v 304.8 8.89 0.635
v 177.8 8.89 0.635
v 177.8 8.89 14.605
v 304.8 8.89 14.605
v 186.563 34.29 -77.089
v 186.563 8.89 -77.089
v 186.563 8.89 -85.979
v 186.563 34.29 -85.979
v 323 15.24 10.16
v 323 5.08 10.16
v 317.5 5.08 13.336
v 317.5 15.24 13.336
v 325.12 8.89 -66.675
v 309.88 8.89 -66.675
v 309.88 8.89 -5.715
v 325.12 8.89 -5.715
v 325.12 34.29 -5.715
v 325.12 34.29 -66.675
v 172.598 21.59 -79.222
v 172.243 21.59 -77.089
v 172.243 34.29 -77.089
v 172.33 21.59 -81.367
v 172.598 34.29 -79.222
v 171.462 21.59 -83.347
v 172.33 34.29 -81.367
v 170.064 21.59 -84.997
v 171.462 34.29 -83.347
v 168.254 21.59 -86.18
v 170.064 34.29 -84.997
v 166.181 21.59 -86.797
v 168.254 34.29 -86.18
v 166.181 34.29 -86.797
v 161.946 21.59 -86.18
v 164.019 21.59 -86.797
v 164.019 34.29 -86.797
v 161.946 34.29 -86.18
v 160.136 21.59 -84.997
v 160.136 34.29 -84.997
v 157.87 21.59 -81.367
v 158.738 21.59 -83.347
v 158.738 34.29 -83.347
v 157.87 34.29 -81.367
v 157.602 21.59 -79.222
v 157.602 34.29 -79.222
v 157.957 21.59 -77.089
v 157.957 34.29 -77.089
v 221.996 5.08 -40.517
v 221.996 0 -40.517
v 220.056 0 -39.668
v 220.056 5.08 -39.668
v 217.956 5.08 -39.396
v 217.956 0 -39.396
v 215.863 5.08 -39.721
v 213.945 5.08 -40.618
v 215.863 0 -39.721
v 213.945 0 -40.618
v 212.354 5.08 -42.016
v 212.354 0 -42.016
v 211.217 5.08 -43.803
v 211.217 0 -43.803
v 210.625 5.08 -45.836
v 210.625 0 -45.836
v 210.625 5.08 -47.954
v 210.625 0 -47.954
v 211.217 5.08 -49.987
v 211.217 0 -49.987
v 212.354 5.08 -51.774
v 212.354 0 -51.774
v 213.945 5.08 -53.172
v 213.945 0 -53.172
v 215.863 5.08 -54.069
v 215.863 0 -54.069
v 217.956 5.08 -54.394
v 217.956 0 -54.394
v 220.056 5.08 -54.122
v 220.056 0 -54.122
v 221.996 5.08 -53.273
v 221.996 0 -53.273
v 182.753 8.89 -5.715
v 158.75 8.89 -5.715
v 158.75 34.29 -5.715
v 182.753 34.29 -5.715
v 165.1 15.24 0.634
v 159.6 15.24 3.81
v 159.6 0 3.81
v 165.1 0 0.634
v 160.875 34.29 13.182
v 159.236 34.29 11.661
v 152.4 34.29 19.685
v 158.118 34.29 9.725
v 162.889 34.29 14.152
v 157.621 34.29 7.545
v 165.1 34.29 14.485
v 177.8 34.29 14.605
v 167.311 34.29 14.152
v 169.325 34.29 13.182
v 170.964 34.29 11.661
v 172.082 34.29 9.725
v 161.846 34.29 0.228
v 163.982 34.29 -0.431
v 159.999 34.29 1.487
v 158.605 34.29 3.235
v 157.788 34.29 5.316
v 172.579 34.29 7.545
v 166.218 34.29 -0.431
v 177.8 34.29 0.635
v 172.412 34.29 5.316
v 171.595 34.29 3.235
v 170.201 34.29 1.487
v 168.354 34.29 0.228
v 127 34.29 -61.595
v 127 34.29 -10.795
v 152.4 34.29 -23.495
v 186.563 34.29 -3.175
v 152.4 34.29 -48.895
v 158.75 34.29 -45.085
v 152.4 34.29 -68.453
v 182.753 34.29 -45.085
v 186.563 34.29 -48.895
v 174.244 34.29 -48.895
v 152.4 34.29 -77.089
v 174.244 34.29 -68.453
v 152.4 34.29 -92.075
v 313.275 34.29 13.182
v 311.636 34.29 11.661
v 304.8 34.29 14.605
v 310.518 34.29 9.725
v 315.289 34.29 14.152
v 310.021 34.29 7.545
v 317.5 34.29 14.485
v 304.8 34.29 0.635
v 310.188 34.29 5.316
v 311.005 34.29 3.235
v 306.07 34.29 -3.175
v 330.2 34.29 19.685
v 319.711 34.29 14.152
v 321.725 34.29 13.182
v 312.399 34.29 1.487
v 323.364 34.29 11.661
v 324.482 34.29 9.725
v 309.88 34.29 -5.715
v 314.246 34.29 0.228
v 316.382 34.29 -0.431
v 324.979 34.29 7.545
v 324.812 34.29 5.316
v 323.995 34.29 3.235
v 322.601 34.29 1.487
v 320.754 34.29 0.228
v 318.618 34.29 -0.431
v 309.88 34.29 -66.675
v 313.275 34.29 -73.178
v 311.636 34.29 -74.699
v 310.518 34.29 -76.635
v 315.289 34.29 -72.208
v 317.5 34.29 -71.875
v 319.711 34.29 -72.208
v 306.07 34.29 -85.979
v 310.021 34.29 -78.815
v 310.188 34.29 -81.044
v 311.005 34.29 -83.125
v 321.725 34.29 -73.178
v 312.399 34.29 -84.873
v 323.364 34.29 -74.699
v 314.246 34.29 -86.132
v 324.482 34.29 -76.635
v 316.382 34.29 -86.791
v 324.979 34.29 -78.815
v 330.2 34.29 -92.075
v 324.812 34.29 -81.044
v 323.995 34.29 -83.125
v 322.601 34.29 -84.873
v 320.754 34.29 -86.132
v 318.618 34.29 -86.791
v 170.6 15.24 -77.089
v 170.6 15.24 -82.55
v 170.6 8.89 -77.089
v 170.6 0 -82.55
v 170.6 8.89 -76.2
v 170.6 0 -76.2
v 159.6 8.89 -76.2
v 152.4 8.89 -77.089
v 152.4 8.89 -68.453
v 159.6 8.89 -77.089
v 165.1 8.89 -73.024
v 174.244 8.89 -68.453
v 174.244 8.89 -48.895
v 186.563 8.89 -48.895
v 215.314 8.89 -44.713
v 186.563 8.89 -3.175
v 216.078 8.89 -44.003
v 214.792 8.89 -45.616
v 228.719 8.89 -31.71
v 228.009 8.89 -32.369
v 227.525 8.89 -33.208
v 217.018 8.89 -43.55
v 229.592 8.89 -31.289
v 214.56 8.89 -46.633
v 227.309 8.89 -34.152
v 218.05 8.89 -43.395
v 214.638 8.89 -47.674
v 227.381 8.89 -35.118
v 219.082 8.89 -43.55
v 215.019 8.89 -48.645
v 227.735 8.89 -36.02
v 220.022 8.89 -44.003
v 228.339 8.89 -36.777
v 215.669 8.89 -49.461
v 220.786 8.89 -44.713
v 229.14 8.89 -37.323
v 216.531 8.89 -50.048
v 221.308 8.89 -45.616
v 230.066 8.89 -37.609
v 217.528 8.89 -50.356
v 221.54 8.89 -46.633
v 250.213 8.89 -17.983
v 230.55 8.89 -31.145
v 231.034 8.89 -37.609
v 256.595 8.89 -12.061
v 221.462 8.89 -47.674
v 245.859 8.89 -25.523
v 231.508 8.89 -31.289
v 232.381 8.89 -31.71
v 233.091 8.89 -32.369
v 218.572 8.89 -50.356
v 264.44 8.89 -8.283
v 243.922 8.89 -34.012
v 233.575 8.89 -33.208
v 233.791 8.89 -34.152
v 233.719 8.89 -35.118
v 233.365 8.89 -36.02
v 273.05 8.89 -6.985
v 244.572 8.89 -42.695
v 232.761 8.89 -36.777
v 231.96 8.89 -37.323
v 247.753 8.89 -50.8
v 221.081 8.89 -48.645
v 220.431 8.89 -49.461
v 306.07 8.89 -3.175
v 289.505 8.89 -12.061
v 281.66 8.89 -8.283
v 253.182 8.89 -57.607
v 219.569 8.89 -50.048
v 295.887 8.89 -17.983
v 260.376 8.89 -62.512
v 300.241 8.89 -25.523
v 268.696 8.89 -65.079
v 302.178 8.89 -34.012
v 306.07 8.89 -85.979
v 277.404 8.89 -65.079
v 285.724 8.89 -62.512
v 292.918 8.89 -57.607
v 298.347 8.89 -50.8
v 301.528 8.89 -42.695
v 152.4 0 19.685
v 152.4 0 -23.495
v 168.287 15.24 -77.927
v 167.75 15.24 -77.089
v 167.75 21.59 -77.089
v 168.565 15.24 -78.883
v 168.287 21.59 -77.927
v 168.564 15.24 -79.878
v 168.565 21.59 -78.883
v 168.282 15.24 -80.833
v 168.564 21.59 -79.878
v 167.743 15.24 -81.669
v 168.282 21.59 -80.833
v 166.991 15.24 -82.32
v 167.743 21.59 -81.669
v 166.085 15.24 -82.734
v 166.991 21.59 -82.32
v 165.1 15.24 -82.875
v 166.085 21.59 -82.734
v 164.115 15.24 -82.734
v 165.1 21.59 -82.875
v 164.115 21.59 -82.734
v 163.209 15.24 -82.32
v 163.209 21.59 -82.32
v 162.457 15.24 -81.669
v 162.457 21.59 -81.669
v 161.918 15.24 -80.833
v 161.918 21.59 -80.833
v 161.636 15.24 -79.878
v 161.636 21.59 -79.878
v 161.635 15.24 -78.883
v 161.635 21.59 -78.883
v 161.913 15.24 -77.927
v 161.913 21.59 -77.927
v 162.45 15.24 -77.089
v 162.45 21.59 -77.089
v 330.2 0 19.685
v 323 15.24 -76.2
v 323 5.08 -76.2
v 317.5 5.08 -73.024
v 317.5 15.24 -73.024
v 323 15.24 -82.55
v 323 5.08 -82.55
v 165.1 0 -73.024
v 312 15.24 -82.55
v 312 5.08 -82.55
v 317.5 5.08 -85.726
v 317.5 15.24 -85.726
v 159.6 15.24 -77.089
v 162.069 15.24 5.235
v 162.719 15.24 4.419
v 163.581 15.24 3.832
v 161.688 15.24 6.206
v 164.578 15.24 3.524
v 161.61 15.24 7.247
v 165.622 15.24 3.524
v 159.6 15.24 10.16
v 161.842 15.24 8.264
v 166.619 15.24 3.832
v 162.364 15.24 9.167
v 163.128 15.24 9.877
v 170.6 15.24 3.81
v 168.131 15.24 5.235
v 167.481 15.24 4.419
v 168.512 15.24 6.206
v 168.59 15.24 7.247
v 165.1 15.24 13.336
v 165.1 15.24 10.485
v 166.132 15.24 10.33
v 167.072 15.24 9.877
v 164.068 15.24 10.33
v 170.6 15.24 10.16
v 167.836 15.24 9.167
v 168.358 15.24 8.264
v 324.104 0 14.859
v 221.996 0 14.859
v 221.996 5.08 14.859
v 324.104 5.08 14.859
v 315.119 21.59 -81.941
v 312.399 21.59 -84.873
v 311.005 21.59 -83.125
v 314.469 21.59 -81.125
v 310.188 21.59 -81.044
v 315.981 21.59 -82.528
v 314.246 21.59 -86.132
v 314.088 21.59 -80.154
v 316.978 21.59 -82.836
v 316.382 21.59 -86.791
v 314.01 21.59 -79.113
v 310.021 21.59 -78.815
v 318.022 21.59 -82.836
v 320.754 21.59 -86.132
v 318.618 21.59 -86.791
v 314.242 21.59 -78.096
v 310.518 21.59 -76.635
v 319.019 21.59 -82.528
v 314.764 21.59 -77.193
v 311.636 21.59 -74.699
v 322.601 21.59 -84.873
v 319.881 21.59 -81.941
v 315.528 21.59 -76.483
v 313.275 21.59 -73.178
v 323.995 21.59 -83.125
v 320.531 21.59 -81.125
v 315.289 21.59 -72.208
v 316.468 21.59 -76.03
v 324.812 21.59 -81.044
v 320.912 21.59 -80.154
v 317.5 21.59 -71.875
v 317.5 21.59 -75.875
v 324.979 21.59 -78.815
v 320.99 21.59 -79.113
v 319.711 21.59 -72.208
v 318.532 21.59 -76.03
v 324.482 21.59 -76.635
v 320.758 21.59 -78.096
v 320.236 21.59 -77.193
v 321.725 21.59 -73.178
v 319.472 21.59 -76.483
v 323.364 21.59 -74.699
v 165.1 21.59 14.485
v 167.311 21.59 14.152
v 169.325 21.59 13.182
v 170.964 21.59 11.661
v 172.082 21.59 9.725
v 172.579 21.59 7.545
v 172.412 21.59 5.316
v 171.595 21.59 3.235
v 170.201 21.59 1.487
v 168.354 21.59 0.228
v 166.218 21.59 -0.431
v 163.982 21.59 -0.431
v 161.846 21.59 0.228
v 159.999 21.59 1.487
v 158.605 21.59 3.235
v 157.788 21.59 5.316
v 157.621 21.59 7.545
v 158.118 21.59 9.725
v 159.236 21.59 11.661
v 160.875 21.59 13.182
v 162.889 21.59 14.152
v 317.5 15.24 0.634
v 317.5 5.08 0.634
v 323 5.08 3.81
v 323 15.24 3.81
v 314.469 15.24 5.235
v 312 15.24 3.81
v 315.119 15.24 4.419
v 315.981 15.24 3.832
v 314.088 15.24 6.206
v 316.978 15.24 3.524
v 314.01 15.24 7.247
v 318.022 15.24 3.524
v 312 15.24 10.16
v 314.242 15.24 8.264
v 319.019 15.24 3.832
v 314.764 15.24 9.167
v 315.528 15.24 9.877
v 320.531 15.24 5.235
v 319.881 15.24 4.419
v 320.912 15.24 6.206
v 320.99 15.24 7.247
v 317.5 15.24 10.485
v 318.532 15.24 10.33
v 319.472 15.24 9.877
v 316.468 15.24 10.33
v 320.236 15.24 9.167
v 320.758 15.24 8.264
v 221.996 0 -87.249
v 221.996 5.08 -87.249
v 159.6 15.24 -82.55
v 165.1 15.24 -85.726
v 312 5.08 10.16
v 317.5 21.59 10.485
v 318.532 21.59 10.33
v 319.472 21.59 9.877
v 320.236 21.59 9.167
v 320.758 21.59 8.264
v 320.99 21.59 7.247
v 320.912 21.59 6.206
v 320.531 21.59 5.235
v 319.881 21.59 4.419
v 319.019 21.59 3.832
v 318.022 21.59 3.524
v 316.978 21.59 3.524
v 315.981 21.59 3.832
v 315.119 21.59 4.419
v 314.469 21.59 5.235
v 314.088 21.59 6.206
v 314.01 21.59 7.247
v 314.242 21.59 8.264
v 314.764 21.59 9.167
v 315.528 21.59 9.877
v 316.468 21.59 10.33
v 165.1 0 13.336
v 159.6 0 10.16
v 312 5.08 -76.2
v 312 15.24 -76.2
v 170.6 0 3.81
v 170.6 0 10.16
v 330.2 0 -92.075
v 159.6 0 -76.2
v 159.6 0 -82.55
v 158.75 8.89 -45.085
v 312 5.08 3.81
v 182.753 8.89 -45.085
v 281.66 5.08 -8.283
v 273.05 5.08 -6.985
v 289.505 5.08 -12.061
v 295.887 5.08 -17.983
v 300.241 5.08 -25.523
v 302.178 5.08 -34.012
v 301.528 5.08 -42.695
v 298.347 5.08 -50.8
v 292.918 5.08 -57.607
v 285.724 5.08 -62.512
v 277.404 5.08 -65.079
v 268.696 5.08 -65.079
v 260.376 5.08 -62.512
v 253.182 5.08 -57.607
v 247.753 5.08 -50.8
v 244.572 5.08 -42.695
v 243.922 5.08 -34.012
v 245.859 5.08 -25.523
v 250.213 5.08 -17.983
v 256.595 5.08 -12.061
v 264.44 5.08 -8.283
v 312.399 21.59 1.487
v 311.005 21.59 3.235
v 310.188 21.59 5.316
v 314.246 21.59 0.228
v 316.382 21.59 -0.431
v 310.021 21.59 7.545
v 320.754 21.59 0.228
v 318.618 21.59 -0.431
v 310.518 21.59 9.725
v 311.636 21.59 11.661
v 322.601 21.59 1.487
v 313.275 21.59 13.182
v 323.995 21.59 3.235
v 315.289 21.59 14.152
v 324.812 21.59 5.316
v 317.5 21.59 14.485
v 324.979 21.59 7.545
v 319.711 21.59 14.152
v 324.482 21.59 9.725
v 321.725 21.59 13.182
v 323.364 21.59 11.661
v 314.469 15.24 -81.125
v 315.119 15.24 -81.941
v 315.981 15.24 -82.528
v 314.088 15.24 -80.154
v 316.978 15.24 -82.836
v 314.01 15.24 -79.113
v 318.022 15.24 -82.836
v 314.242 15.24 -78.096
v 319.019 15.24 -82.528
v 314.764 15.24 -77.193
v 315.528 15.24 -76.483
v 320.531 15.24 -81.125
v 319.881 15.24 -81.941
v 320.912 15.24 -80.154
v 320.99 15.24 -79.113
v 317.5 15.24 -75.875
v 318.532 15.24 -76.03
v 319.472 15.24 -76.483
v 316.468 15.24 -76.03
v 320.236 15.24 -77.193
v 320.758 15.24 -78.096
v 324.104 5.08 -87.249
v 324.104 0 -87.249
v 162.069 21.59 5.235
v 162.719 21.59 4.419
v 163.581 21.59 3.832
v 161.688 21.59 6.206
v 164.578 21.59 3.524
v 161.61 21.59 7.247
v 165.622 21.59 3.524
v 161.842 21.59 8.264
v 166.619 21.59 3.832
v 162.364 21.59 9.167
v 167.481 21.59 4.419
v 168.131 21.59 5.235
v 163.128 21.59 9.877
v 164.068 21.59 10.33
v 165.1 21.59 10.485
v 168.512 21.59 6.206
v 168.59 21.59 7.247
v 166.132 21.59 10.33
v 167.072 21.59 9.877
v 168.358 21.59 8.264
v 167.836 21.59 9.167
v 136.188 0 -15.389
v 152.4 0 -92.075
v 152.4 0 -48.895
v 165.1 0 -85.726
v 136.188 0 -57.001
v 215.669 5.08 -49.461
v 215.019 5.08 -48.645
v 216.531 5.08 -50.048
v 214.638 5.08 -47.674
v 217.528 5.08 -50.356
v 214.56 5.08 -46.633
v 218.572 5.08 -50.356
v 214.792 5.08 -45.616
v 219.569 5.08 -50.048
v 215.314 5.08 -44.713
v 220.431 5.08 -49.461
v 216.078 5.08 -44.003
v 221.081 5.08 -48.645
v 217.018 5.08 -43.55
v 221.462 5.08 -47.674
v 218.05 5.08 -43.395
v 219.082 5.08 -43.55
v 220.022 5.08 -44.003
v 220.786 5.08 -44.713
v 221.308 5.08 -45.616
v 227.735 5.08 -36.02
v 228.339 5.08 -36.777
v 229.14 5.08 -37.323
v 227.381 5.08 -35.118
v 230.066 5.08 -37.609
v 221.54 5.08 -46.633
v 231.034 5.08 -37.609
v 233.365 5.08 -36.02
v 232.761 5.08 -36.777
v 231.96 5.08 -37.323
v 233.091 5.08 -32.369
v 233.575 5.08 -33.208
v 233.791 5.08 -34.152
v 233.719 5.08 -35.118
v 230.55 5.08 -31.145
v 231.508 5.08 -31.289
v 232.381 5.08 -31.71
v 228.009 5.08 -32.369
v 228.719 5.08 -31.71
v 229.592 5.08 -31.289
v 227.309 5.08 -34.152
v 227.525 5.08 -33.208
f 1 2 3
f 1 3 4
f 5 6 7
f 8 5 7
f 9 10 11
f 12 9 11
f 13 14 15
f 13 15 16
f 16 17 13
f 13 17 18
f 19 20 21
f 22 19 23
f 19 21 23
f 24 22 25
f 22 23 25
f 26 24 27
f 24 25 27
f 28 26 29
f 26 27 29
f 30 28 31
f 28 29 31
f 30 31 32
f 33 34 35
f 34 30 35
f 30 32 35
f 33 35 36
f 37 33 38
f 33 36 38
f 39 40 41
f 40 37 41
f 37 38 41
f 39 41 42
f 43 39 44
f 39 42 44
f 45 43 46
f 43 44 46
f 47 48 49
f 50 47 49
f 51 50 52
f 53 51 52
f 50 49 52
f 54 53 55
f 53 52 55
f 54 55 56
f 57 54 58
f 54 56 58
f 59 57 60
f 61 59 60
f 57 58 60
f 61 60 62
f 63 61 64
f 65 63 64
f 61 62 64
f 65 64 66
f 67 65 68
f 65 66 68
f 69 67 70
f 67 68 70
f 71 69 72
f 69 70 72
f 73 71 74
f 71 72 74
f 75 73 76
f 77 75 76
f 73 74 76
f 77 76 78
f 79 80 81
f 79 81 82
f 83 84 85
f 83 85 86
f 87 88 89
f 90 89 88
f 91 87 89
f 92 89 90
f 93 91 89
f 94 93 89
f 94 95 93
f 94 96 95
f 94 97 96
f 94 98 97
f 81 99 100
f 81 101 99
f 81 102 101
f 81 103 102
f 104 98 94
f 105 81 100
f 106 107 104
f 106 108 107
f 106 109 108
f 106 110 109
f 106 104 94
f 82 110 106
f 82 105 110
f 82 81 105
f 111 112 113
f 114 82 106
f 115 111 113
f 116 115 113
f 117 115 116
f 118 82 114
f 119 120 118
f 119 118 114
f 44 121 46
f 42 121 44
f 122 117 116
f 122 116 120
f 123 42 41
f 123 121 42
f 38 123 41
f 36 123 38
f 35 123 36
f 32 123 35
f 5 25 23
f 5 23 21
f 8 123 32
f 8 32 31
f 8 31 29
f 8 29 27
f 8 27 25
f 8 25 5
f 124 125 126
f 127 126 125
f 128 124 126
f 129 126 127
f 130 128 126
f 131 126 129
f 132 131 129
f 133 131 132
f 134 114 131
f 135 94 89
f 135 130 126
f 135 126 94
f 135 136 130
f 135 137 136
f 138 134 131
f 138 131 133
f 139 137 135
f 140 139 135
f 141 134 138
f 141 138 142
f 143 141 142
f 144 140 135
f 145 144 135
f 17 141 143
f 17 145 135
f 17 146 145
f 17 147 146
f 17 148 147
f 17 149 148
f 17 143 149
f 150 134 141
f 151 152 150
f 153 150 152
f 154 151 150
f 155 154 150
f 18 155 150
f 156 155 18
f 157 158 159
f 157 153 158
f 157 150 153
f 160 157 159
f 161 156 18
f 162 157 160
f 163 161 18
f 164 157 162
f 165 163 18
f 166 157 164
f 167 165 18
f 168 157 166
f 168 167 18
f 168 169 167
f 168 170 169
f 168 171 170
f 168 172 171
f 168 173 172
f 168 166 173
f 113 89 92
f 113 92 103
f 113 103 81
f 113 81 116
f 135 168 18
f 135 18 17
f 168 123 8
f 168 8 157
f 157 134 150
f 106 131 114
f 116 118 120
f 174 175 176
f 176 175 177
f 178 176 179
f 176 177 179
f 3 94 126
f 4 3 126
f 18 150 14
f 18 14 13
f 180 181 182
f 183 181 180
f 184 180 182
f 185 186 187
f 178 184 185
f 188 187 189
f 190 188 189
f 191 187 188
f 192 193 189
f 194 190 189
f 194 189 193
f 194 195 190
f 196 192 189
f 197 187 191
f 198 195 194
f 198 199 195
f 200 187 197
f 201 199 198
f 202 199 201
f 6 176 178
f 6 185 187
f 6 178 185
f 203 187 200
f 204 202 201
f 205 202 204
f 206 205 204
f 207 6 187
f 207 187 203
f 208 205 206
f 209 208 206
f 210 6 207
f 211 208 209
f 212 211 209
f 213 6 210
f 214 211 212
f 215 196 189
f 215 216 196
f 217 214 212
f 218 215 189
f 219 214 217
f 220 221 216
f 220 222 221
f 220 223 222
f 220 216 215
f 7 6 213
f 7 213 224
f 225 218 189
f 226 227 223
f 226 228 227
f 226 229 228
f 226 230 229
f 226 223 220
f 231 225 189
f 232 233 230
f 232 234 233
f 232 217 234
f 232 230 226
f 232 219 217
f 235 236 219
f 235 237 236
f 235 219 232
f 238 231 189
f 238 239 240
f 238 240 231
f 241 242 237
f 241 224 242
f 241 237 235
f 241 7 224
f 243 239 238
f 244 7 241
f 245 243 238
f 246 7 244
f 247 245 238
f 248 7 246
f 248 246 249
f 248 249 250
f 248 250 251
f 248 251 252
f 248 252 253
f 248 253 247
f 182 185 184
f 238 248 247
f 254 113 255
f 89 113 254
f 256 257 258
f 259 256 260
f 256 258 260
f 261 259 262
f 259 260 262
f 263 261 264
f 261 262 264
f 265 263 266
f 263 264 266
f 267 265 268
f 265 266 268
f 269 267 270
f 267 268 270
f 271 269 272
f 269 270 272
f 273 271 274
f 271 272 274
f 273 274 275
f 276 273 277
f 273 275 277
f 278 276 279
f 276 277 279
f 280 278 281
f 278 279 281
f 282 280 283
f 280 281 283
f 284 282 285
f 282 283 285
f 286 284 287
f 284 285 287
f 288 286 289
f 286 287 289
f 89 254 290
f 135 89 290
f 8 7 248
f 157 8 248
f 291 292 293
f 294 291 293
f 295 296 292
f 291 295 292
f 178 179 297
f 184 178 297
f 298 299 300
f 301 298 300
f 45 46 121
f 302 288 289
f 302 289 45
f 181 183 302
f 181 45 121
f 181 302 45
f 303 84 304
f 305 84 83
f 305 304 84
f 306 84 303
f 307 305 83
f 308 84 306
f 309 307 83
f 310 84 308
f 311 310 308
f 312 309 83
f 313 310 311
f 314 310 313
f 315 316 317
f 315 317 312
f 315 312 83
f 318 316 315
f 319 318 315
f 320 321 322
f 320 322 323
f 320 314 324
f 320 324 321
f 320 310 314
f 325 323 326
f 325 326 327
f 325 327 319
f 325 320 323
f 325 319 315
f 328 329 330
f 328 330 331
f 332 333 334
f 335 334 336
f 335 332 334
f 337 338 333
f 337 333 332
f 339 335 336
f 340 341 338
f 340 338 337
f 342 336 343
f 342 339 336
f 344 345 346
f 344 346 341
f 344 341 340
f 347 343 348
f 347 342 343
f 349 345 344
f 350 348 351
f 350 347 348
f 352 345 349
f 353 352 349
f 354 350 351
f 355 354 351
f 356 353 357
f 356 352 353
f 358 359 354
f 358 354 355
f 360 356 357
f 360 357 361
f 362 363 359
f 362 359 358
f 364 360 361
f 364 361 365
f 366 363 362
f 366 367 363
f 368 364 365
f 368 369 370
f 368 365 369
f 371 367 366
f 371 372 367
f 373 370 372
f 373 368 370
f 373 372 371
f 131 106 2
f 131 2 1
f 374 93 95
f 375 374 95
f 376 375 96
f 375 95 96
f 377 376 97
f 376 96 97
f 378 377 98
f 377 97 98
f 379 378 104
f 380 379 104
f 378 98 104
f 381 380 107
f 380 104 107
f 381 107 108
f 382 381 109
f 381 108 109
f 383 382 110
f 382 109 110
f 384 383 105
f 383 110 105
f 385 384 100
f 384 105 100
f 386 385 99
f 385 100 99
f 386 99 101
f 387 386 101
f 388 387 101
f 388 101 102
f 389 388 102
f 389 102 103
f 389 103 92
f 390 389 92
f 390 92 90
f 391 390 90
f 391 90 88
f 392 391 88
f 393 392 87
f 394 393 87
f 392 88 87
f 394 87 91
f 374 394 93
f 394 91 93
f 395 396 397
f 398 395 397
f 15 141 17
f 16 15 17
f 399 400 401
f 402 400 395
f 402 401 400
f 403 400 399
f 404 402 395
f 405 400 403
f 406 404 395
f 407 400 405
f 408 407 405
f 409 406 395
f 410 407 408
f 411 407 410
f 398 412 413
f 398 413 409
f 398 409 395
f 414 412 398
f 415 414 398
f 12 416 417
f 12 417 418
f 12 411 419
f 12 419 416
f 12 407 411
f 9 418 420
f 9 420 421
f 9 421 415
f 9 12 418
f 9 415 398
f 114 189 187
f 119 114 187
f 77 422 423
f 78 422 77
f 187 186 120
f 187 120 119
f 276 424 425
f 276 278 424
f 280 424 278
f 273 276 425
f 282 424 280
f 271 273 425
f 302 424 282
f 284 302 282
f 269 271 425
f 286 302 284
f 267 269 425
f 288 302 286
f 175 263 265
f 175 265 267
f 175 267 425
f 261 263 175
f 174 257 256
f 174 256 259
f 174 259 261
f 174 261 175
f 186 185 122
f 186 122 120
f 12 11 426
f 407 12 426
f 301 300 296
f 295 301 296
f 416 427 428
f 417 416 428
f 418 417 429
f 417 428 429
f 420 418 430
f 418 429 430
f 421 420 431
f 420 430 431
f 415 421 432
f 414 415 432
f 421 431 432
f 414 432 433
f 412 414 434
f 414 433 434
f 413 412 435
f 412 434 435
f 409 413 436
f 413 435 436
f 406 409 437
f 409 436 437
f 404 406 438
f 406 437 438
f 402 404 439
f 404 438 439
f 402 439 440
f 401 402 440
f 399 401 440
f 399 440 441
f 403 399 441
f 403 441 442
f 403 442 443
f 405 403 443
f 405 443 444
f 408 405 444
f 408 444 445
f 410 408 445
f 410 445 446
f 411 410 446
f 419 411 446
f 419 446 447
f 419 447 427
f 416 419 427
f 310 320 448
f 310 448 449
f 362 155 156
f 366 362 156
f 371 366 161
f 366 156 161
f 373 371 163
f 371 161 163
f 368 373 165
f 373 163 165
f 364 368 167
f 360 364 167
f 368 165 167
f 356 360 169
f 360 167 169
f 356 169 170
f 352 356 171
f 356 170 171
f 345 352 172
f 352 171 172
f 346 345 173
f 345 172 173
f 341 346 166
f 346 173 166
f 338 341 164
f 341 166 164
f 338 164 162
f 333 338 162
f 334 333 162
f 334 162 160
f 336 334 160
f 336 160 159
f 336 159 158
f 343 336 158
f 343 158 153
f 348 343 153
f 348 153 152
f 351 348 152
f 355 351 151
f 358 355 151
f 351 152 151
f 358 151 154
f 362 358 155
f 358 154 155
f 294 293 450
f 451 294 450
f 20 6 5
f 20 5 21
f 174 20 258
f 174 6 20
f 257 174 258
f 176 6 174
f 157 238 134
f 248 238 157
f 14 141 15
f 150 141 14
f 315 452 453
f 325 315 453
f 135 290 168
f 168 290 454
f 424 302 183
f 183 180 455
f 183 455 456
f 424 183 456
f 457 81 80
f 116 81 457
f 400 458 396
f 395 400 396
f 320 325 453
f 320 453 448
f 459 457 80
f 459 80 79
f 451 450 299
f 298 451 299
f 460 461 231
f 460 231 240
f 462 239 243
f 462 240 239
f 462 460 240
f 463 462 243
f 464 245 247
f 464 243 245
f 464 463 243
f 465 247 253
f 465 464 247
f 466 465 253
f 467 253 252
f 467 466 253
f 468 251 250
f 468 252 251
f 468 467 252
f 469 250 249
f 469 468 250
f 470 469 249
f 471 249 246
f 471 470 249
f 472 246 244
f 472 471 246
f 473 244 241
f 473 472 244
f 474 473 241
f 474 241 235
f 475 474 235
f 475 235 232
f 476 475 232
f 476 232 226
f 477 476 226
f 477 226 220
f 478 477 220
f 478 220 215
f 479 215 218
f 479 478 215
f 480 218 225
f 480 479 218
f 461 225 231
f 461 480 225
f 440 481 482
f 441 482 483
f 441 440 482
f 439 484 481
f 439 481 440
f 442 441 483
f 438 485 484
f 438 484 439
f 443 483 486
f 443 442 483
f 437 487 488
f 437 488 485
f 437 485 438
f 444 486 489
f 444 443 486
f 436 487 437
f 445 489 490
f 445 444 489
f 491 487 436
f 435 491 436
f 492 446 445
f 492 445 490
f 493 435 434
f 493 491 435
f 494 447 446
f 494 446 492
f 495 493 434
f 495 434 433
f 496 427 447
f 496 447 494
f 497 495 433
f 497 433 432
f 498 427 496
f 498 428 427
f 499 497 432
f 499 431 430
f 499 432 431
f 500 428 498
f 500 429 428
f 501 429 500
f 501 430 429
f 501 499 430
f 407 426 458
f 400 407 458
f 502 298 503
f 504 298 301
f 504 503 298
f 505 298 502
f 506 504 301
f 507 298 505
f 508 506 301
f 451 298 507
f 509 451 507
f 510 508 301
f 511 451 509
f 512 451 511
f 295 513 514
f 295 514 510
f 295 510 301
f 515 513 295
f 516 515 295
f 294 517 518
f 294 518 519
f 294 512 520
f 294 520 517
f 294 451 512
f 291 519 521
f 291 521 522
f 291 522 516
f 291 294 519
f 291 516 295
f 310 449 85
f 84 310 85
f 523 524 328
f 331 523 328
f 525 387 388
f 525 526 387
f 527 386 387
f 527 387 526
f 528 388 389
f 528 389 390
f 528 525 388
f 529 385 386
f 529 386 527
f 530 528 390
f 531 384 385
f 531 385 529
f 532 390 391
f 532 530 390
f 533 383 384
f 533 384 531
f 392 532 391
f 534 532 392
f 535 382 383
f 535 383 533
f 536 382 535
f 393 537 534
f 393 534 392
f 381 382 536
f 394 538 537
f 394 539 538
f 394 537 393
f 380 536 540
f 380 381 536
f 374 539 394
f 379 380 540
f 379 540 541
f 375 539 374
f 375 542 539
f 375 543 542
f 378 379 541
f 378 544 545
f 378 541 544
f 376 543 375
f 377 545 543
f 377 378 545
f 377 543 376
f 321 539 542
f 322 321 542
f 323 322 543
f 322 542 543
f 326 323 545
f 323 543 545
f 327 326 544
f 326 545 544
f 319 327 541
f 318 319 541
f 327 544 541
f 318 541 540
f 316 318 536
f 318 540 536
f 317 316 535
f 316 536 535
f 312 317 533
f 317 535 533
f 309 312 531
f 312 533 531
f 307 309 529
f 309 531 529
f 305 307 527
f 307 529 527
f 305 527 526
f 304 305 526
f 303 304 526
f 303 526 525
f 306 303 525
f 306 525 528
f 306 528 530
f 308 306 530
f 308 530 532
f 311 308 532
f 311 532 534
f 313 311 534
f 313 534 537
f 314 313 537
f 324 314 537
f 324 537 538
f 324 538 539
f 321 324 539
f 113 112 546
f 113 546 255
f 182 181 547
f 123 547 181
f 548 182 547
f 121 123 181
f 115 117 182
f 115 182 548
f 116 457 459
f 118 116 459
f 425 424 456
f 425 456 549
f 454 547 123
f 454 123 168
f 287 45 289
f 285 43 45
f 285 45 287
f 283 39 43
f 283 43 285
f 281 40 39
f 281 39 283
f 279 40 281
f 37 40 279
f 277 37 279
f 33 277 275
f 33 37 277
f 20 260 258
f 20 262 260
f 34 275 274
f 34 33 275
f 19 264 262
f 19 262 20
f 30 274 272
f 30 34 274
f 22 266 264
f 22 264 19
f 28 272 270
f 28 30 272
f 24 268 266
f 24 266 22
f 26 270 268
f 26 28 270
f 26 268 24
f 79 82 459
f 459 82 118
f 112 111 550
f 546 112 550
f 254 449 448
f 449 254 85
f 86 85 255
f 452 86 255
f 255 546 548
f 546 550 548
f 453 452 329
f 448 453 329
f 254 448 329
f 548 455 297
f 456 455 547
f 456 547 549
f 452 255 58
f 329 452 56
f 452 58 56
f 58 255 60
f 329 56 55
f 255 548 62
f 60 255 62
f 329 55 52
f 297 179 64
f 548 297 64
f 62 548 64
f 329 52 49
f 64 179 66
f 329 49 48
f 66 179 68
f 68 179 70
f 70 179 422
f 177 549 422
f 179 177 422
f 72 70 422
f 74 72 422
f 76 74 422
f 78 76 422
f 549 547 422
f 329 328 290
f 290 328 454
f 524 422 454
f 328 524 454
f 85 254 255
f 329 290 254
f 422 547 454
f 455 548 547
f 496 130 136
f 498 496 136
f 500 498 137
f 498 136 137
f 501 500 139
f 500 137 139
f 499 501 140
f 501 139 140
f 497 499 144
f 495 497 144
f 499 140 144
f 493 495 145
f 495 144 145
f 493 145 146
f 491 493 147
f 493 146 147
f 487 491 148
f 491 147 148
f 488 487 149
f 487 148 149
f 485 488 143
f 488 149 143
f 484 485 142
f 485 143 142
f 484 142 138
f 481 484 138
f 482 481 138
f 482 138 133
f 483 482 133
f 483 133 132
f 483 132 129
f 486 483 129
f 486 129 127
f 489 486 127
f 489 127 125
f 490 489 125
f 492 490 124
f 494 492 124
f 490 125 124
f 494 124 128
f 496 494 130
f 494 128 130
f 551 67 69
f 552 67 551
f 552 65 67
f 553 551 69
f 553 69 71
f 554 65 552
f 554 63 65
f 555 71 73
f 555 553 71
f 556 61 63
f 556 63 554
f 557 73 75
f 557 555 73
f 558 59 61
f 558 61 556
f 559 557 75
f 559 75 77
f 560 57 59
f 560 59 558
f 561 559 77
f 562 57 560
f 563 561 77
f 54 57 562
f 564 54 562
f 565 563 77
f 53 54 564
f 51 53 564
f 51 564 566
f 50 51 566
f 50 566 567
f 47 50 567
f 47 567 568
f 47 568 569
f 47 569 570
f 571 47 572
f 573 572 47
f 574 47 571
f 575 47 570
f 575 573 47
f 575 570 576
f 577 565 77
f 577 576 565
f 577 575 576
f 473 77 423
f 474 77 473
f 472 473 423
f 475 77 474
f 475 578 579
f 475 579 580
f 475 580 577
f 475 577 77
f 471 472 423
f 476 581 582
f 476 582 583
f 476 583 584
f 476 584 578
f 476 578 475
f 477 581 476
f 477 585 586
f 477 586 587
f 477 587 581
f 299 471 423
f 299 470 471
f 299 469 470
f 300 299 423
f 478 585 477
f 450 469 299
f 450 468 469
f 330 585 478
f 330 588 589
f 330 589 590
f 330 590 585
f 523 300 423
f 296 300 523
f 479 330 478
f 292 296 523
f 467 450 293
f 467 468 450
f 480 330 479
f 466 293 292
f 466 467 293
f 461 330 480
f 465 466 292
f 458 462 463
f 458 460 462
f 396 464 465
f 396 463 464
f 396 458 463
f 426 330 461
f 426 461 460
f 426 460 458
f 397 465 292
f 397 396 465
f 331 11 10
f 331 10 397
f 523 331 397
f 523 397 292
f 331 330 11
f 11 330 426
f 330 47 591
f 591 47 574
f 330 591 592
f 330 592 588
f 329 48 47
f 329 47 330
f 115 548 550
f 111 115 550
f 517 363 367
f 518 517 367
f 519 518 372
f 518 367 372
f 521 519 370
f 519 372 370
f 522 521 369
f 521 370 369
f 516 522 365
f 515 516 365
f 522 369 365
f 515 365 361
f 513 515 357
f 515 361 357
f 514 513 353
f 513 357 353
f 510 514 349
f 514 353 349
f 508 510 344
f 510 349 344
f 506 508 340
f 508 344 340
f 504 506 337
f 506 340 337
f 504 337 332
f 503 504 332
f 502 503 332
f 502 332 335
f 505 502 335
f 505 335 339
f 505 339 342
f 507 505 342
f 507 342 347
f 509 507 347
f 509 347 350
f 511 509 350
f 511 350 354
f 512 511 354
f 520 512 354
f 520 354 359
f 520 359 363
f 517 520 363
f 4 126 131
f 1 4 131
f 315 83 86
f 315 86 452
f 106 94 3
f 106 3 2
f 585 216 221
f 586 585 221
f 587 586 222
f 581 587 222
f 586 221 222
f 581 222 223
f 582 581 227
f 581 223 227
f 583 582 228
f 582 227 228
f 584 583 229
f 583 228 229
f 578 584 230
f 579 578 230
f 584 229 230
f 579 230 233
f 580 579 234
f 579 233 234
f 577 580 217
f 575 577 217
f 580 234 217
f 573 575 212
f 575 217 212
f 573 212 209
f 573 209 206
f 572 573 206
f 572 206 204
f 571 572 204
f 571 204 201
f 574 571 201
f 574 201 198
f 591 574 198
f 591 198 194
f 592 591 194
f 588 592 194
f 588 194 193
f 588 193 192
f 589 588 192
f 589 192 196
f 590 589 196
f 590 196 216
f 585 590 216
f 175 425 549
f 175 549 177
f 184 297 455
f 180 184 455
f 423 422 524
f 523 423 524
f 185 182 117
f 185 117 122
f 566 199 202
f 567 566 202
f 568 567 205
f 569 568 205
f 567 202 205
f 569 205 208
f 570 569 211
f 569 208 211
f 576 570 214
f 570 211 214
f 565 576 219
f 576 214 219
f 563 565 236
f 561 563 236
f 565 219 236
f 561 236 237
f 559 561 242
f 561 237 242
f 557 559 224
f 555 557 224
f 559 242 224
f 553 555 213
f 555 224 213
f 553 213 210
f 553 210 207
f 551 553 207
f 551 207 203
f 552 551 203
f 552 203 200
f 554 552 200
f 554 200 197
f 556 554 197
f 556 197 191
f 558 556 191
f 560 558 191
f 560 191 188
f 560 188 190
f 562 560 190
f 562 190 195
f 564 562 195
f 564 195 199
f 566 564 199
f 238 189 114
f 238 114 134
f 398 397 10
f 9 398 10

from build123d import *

# Parameters (mm, degrees)
SKETCH3_W           = 381
SKETCH3_H           = 111.76
BOSS_EXTRUDE1_DEPTH = 34.29
SKETCH2_4_R         = 29.21
CUT_EXTRUDE2_DEPTH  = 127
CUT_EXTRUDE3_START  = 8.89
SKETCH2_5_W         = 119.507
SKETCH2_5_H         = 82.804
CUT_EXTRUDE3_DEPTH  = 127
CUT_EXTRUDE4_START  = 8.89
SKETCH2_W           = 6.604
SKETCH2_H           = 8.636
CUT_EXTRUDE4_DEPTH  = 127
CUT_EXTRUDE6_DEPTH  = 127
CUT_EXTRUDE7_DEPTH  = 127
SKETCH7_W           = 19.689939458
SKETCH7_H           = 8.636
CUT_EXTRUDE8_DEPTH  = 25.4
SKETCH8_W           = 102.108
SKETCH8_H           = 102.108
CUT_EXTRUDE9_DEPTH  = 5.08
SKETCH9_R           = 7.5
CUT_EXTRUDE10_DEPTH = 12.7
SKETCH10_R          = 3.5
CUT_EXTRUDE11_DEPTH = 55.372
CUT_EXTRUDE12_DEPTH = 15.24
SKETCH12_R          = 3.25
SKETCH12_R_2        = 3.5
CUT_EXTRUDE13_DEPTH = 12.446
SKETCH13_R          = 7.5
CUT_EXTRUDE14_DEPTH = 5.08
SKETCH14_W          = 127
SKETCH14_H          = 13.97
SKETCH14_W_2        = 24.003
SKETCH14_H_2        = 39.37
SKETCH14_W_3        = 15.24
SKETCH14_H_3        = 60.96
CUT_EXTRUDE15_DEPTH = 25.4


with BuildPart() as part:
    # Sketch3 → Boss-Extrude1 (new body)
    with BuildSketch(Plane(origin=(0, 0, 0), x_dir=(1, 0, 0), z_dir=(0, 1, 0))):
        with Locations((139.7, 36.195)):
            Rectangle(SKETCH3_W, SKETCH3_H)
    extrude(amount=BOSS_EXTRUDE1_DEPTH)

    # Sketch2<4> → Cut-Extrude2 (cut)
    with BuildSketch(Plane(origin=(0, 0, 0), x_dir=(1, 0, 0), z_dir=(0, 1, 0))):
        with Locations(Location((273.05, 36.195, 0), (0, 0, 270))):
            Circle(SKETCH2_4_R)
    extrude(amount=CUT_EXTRUDE2_DEPTH, mode=Mode.SUBTRACT)

    # Sketch2<5> → Cut-Extrude3 (cut)
    with BuildSketch(Plane(origin=(0, 0, 0), x_dir=(1, 0, 0), z_dir=(0, 1, 0)).offset(CUT_EXTRUDE3_START)):
        with Locations((246.3165, 44.577)):
            Rectangle(SKETCH2_5_W, SKETCH2_5_H)
    extrude(amount=CUT_EXTRUDE3_DEPTH, mode=Mode.SUBTRACT)

    # Sketch2 → Cut-Extrude4 (cut)
    with BuildSketch(Plane(origin=(0, 0, 0), x_dir=(1, 0, 0), z_dir=(0, 1, 0)).offset(CUT_EXTRUDE4_START)):
        Polygon((174.244, 48.895), (186.563, 48.895), (186.563, 77.089), (174.244, 77.089), (174.244, 68.453), align=None)
        with Locations((170.942, 72.771)):
            Rectangle(SKETCH2_W, SKETCH2_H)
    extrude(amount=CUT_EXTRUDE4_DEPTH, mode=Mode.SUBTRACT)

    # Sketch4 → Cut-Extrude6 (cut)
    with BuildSketch(Plane(origin=(0, 34.29, 0), x_dir=(1, 0, 0), z_dir=(0, 1, 0))):
        Polygon((152.4, 48.895), (127, 61.595), (127, 10.795), (152.4, 23.495), (152.4, -19.685), (-50.8, -19.685), (-50.8, 92.075), (152.4, 92.075), align=None)
    extrude(amount=-CUT_EXTRUDE6_DEPTH, mode=Mode.SUBTRACT)

    # Sketch6 → Cut-Extrude7 (cut)
    with BuildSketch(Plane.XY.offset(19.685)):
        Polygon((127, 34.29), (136.187977808, 0), (101.054732315, 0), align=None)
    extrude(amount=-CUT_EXTRUDE7_DEPTH, mode=Mode.SUBTRACT)

    # Sketch7 → Cut-Extrude8 (cut)
    with BuildSketch(Plane(origin=(0, 34.29, 0), x_dir=(1, 0, 0), z_dir=(0, 1, 0))):
        with Locations((157.795030271, 72.771)):
            Rectangle(SKETCH7_W, SKETCH7_H)
    extrude(amount=-CUT_EXTRUDE8_DEPTH, mode=Mode.SUBTRACT)

    # Sketch8 → Cut-Extrude9 (cut)
    with BuildSketch(Plane.XZ):
        with Locations((273.05, -36.195)):
            Rectangle(SKETCH8_W, SKETCH8_H)
    extrude(amount=-CUT_EXTRUDE9_DEPTH, mode=Mode.SUBTRACT)

    # Sketch9 → Cut-Extrude10 (cut)
    with BuildSketch(Plane(origin=(0, 34.29, 0), x_dir=(1, 0, 0), z_dir=(0, 1, 0))):
        with Locations(Location((317.5, 79.375, 0), (0, 0, 270))):
            Circle(SKETCH9_R)
        with Locations(Location((317.5, -6.985, 0), (0, 0, 270))):
            Circle(SKETCH9_R)
        with Locations((165.1, 79.375)):
            Circle(SKETCH9_R)
        with Locations(Location((165.1, -6.985, 0), (0, 0, 270))):
            Circle(SKETCH9_R)
    extrude(amount=-CUT_EXTRUDE10_DEPTH, mode=Mode.SUBTRACT)

    # Sketch10 → Cut-Extrude11 (cut)
    with BuildSketch(Plane(origin=(0, 21.59, 0), x_dir=(1, 0, 0), z_dir=(0, 1, 0))):
        with Locations(Location((317.5, 79.375, 0), (0, 0, 270))):
            Circle(SKETCH10_R)
        with Locations(Location((317.5, -6.985, 0), (0, 0, 270))):
            Circle(SKETCH10_R)
        with Locations(Location((165.1, -6.985, 0), (0, 0, 270))):
            Circle(SKETCH10_R)
        with Locations(Location((165.1, 79.375, 0), (0, 0, 270))):
            Circle(SKETCH10_R)
    extrude(amount=-CUT_EXTRUDE11_DEPTH, mode=Mode.SUBTRACT)

    # Sketch11 → Cut-Extrude12 (cut)
    with BuildSketch(Plane.XZ):
        Polygon((159.6, -82.550426481), (165.1, -85.725852961), (170.6, -82.550426481), (170.6, -76.199573519), (165.1, -73.024147039), (159.6, -76.199573519), align=None)
        Polygon((312, 3.809573519), (317.5, 0.634147039), (323, 3.809573519), (323, 10.160426481), (317.5, 13.335852961), (312, 10.160426481), align=None)
        Polygon((165.1, 0.634147039), (170.6, 3.809573519), (170.6, 10.160426481), (165.1, 13.335852961), (159.6, 10.160426481), (159.6, 3.809573519), align=None)
        Polygon((317.5, -85.725852961), (323, -82.550426481), (323, -76.199573519), (317.5, -73.024147039), (312, -76.199573519), (312, -82.550426481), align=None)
    extrude(amount=-CUT_EXTRUDE12_DEPTH, mode=Mode.SUBTRACT)

    # Sketch12 → Cut-Extrude13 (cut)
    with BuildSketch(Plane(origin=(0, 8.89, 0), x_dir=(1, 0, 0), z_dir=(0, 1, 0))):
        with Locations(Location((230.55, 34.395, 0), (0, 0, 270))):
            Circle(SKETCH12_R)
        with Locations(Location((218.05, 46.895, 0), (0, 0, 270))):
            Circle(SKETCH12_R_2)
    extrude(amount=-CUT_EXTRUDE13_DEPTH, mode=Mode.SUBTRACT)

    # Sketch13 → Cut-Extrude14 (cut)
    with BuildSketch(Plane.XZ):
        with Locations((218.05, -46.895)):
            Circle(SKETCH13_R)
    extrude(amount=-CUT_EXTRUDE14_DEPTH, mode=Mode.SUBTRACT)

    # Sketch14 → Cut-Extrude15 (cut)
    with BuildSketch(Plane(origin=(0, 34.29, 0), x_dir=(1, 0, 0), z_dir=(0, 1, 0))):
        with Locations((241.3, -7.62)):
            Rectangle(SKETCH14_W, SKETCH14_H)
        with Locations((170.7515, 25.4)):
            Rectangle(SKETCH14_W_2, SKETCH14_H_2)
        with Locations((317.5, 36.195)):
            Rectangle(SKETCH14_W_3, SKETCH14_H_3)
    extrude(amount=-CUT_EXTRUDE15_DEPTH, mode=Mode.SUBTRACT)


solid = part.part
